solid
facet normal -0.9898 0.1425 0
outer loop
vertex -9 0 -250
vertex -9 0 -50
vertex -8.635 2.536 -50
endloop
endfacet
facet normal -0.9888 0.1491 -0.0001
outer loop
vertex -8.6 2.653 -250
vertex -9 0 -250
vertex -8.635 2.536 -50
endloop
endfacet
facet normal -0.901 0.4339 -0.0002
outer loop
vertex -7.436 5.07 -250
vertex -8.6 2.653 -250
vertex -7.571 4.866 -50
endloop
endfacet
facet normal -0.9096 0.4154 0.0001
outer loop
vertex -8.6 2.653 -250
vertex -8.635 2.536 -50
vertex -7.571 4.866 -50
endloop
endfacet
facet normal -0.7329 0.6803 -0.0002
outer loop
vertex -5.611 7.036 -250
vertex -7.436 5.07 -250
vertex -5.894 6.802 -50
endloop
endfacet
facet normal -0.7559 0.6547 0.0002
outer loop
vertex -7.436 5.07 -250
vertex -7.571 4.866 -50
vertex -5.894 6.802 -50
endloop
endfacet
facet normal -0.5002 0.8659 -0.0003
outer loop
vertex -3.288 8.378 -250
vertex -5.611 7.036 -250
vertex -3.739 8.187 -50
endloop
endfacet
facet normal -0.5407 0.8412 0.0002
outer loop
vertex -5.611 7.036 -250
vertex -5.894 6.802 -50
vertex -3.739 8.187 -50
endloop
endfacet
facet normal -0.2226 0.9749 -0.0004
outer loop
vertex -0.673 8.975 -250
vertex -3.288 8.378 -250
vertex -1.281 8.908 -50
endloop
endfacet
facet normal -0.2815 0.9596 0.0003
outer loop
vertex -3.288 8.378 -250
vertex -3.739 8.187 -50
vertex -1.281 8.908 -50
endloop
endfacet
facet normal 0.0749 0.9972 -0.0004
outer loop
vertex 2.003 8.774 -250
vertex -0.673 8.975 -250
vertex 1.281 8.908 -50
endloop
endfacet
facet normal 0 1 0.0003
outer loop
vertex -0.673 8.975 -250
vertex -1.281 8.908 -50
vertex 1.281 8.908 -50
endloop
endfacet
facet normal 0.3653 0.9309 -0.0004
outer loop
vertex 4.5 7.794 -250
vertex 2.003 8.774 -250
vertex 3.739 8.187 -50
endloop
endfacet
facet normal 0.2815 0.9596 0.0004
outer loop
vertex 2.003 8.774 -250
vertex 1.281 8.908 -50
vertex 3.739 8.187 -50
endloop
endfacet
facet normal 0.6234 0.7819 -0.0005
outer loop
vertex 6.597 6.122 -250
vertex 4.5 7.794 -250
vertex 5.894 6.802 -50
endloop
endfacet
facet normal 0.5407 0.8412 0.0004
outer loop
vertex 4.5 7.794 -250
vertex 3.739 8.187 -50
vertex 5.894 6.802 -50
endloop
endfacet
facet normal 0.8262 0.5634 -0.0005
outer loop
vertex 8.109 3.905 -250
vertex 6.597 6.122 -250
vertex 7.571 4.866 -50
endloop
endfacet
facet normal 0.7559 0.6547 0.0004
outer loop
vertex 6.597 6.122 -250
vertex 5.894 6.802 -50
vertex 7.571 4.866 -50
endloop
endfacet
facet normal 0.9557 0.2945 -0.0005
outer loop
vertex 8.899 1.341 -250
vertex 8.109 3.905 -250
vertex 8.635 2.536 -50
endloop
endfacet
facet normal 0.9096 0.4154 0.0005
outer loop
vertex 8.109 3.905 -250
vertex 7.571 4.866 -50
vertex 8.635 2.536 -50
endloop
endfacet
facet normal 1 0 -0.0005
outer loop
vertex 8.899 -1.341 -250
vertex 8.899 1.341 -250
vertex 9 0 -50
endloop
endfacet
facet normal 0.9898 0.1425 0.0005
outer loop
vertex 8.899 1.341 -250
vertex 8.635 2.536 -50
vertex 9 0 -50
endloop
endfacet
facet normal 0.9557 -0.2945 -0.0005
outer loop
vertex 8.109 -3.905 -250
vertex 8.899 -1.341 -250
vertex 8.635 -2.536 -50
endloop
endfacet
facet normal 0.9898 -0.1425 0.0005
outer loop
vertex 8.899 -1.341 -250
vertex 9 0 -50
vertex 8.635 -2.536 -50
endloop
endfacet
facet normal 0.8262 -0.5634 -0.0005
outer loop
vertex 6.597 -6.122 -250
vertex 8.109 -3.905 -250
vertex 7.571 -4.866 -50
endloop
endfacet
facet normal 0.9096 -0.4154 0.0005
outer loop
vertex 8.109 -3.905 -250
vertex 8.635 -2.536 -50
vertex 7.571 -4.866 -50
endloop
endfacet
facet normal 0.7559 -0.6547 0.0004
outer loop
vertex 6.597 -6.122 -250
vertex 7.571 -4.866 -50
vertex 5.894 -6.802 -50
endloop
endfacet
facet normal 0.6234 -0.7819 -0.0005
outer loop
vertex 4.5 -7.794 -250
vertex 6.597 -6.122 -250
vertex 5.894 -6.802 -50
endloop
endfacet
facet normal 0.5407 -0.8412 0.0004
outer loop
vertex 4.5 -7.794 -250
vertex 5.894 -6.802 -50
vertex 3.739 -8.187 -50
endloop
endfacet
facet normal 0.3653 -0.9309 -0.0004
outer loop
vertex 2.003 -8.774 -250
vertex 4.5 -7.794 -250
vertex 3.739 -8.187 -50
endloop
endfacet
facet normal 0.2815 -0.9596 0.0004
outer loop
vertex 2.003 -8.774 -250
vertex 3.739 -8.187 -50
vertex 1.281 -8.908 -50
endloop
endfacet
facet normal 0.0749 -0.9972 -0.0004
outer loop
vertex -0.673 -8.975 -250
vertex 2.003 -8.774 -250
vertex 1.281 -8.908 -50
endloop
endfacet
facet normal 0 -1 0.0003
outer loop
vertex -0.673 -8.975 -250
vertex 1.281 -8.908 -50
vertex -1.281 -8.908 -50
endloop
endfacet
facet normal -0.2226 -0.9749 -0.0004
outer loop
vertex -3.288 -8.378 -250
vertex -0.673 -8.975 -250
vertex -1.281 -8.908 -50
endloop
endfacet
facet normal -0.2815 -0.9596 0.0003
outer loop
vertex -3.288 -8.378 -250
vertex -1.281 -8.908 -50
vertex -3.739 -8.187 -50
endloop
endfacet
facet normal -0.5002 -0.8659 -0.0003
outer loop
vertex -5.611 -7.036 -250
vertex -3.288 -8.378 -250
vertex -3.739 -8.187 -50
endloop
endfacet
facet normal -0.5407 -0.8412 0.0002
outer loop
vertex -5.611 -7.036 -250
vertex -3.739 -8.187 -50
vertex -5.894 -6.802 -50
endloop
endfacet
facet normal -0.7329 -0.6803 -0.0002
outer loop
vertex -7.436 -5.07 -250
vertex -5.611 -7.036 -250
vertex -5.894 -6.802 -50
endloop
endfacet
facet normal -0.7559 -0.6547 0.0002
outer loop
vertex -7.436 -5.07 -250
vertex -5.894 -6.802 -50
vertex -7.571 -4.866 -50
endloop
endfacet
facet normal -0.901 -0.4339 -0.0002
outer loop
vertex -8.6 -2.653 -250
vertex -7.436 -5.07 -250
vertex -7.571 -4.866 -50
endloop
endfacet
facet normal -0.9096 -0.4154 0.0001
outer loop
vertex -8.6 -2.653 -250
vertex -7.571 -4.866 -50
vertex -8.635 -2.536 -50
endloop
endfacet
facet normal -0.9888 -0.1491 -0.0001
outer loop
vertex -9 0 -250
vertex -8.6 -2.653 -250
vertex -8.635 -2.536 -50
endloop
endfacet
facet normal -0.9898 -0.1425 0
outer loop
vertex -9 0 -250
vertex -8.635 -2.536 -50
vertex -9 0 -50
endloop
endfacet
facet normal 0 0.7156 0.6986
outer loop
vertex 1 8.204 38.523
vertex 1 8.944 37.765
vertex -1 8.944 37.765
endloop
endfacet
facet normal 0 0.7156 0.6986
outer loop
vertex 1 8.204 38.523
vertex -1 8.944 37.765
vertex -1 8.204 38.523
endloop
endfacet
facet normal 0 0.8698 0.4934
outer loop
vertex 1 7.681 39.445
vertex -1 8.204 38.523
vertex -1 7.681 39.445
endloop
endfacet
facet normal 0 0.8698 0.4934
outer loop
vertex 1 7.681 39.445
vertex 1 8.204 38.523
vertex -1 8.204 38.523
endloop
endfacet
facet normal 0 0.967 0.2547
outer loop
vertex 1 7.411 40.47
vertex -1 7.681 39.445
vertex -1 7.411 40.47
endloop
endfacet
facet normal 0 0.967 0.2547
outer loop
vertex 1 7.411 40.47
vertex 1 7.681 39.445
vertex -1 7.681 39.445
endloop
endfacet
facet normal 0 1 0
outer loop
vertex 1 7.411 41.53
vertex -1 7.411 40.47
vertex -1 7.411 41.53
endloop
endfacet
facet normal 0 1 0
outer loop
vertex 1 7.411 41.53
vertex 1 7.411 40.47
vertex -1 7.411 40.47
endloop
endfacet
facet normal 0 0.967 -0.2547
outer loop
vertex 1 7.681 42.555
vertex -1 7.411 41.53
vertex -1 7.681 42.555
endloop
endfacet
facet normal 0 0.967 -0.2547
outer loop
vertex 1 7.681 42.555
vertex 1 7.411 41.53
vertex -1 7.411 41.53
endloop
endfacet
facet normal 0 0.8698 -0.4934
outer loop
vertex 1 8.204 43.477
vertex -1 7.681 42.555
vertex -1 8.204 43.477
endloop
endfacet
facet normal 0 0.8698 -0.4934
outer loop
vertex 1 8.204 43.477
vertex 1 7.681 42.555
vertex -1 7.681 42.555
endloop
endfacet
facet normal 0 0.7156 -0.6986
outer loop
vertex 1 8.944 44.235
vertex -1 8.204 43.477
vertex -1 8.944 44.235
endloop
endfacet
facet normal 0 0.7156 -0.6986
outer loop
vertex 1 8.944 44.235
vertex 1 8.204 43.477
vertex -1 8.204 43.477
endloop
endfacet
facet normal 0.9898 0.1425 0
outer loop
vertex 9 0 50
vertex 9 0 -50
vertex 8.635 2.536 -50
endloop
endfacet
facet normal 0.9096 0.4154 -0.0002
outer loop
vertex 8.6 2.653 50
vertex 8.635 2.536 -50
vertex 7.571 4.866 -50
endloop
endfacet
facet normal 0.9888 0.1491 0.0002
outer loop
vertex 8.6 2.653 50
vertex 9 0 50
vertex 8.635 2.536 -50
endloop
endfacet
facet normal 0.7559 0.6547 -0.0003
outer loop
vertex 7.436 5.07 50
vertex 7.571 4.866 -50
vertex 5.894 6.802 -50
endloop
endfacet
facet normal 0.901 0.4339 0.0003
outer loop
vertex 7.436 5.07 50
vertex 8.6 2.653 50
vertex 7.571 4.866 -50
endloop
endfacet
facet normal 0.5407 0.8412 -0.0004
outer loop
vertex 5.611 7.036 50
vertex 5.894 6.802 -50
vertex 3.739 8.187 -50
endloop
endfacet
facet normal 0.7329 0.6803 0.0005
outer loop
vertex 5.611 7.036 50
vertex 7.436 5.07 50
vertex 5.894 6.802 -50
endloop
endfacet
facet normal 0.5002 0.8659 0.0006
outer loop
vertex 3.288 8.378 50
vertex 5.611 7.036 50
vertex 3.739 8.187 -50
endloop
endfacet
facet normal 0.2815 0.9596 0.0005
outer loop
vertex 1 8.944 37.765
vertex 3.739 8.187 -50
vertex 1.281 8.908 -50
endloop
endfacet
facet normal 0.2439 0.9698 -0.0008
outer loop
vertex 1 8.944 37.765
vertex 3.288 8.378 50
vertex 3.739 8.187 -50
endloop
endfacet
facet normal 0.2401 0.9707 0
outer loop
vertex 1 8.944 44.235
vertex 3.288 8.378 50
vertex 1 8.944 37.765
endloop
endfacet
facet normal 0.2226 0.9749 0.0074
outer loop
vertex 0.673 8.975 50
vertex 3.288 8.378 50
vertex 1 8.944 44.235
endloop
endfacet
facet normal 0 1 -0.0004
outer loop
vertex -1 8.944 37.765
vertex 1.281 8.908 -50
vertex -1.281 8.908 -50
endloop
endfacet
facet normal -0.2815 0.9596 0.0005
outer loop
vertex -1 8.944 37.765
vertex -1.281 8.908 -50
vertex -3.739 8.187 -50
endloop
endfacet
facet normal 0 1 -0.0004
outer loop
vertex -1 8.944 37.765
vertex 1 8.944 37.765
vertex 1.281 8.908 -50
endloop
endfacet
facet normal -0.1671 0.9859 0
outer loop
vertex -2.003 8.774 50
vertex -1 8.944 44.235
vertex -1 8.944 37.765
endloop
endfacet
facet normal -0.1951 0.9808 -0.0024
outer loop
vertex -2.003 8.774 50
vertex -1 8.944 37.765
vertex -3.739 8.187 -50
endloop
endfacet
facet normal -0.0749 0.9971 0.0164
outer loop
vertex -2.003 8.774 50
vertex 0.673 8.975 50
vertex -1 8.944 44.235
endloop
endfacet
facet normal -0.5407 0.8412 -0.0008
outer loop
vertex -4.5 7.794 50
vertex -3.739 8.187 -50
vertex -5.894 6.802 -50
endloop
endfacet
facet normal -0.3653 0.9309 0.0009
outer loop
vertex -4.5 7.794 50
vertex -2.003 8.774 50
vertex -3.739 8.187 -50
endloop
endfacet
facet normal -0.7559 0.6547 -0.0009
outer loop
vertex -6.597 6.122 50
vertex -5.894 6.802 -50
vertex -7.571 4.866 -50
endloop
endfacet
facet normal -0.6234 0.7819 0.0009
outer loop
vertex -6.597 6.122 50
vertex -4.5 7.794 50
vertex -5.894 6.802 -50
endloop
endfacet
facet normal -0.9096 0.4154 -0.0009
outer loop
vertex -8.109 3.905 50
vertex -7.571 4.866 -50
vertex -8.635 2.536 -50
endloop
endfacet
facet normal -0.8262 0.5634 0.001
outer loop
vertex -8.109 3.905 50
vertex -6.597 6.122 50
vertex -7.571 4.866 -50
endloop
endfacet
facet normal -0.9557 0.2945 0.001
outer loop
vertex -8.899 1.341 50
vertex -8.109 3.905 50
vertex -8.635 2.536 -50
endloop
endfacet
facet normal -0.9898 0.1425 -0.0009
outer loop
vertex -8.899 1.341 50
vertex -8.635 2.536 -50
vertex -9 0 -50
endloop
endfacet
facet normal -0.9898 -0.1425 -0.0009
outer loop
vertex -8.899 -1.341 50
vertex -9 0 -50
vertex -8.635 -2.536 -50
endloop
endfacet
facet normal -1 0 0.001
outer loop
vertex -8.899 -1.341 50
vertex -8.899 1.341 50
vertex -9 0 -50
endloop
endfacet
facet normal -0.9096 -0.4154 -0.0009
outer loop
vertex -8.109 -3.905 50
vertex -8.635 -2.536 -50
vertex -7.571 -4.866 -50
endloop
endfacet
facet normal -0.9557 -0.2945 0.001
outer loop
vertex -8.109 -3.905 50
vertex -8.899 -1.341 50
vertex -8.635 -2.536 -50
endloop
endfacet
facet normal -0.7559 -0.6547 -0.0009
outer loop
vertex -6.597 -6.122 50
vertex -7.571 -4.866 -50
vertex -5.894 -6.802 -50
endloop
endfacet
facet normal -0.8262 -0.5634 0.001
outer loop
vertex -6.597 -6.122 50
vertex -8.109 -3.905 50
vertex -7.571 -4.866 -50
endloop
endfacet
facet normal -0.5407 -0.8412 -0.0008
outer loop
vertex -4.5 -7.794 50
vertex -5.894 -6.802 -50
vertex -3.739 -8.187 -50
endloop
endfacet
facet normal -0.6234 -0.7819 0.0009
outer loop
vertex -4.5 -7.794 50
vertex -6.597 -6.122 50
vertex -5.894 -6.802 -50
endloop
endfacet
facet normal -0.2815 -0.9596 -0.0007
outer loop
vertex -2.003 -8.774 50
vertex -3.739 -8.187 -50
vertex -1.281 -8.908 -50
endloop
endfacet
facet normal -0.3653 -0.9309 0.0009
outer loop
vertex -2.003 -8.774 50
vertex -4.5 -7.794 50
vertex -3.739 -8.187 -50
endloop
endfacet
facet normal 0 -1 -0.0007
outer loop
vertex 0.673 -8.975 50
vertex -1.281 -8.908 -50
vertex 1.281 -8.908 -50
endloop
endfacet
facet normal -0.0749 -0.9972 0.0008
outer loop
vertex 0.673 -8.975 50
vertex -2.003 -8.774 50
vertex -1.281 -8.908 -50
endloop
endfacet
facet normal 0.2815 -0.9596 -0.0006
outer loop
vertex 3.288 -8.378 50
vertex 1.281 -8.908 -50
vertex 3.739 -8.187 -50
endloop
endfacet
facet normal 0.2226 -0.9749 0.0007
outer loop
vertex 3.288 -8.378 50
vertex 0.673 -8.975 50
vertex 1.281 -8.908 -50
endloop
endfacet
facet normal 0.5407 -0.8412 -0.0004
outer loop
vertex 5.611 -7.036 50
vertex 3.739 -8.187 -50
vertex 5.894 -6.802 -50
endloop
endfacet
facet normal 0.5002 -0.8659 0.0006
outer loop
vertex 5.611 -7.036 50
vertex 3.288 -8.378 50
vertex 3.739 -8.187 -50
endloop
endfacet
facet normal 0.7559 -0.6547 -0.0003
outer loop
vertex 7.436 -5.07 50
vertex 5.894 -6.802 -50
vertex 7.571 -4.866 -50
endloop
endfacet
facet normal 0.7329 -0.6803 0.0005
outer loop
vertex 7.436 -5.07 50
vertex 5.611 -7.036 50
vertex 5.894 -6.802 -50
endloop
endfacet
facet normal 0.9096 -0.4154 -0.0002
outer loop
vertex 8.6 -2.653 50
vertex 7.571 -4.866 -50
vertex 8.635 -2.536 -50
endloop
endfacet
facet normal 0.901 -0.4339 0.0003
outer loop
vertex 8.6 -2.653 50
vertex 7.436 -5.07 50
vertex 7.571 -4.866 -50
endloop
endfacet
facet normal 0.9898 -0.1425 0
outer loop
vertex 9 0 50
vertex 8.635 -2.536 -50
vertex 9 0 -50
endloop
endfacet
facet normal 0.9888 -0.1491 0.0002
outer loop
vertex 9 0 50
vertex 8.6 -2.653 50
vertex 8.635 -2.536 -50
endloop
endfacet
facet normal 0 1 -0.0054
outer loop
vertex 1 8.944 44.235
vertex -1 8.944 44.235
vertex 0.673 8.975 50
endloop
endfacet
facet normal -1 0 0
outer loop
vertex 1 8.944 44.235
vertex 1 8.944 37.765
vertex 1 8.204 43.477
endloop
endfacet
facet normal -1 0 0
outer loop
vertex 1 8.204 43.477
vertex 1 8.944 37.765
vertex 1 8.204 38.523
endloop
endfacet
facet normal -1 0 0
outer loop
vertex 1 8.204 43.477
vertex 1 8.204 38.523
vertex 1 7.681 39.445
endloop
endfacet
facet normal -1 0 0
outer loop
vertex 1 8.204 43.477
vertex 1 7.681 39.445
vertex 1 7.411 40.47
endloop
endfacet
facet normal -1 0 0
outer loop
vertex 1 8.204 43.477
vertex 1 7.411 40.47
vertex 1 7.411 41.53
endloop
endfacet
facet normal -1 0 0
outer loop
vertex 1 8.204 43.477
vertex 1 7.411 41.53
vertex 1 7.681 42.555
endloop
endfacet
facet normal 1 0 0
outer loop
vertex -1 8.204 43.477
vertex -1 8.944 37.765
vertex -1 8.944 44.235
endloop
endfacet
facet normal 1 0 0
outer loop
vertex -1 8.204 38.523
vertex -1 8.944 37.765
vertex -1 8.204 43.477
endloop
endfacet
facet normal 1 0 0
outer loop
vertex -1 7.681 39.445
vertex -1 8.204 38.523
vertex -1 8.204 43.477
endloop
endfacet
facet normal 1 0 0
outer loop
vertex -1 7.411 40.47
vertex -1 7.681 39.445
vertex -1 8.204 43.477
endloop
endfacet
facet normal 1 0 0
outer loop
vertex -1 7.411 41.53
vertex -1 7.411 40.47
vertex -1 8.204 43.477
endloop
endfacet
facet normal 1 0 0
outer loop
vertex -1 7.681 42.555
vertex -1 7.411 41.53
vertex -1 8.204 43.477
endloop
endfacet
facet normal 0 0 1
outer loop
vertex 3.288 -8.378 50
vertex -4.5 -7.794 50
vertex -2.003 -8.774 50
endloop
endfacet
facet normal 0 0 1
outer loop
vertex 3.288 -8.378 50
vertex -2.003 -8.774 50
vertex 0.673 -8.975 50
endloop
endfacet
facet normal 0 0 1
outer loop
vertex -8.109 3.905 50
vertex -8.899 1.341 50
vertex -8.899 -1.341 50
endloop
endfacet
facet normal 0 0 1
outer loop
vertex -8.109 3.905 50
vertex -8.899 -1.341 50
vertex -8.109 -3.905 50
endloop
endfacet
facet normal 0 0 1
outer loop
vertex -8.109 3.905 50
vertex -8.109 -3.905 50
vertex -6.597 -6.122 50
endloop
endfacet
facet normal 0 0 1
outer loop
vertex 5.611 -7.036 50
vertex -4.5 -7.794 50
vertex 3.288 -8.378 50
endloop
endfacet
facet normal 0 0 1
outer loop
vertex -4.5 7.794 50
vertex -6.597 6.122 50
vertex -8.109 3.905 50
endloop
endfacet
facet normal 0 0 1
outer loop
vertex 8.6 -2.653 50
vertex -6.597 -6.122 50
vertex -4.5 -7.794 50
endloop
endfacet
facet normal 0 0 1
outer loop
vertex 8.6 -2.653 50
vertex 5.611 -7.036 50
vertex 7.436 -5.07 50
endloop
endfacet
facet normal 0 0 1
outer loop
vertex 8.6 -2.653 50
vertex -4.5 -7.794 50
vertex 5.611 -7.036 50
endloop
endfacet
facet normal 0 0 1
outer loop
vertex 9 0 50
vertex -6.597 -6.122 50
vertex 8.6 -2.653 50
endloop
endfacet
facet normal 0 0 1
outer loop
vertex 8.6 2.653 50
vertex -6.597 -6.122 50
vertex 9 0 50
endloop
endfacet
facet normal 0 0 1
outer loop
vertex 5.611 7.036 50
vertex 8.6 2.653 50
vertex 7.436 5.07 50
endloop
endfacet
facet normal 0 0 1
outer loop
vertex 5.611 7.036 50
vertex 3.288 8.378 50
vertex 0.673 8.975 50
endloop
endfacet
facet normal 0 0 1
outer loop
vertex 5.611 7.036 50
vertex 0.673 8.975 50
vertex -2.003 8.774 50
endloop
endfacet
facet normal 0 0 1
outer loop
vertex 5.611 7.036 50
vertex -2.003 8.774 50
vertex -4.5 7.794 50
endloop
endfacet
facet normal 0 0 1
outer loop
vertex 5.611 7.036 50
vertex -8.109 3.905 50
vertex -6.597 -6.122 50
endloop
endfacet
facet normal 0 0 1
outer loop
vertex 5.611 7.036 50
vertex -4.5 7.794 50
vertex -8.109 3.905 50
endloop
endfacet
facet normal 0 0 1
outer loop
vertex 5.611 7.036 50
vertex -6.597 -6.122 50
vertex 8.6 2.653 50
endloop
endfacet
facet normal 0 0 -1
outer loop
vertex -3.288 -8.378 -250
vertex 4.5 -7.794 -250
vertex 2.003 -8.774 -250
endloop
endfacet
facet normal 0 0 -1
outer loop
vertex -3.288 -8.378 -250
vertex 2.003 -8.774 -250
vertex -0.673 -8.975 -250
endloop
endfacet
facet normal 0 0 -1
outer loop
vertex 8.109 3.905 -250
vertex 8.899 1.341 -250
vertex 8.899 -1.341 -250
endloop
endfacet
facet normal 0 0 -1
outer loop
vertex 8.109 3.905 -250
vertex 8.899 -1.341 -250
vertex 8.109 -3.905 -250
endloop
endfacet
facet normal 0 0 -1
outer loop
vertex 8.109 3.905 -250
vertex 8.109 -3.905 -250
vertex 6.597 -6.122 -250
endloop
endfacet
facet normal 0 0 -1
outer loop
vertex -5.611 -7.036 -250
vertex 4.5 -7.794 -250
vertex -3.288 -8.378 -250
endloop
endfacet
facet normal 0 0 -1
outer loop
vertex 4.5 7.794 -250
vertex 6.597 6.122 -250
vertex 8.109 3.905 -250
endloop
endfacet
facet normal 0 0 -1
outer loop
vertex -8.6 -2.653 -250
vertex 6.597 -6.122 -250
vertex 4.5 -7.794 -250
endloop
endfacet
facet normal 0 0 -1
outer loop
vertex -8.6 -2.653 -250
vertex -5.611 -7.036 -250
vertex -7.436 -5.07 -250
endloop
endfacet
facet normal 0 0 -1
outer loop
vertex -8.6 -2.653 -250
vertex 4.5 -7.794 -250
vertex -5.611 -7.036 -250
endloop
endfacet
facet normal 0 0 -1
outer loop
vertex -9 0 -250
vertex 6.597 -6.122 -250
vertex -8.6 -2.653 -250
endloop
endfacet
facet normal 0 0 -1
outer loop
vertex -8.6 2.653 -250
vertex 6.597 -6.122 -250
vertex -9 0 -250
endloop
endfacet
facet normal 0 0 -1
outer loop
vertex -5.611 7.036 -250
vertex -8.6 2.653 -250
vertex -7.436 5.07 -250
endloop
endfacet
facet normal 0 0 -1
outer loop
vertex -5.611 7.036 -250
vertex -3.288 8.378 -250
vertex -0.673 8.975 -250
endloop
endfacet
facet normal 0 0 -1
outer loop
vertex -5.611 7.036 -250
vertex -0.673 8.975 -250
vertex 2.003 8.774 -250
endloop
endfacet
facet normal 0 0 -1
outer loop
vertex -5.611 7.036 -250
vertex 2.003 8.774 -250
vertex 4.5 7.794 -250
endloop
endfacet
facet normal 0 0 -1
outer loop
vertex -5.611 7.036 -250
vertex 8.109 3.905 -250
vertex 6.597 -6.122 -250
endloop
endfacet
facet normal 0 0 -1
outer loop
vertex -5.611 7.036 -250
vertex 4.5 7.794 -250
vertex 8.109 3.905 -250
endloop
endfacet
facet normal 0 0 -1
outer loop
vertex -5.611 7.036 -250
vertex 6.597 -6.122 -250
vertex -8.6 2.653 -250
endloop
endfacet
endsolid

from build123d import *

# Parameters (mm, degrees)
SKETCH1_R           = 9
BOSS_EXTRUDE1_DEPTH = 50
CUT_EXTRUDE1_DEPTH  = 1
SKETCH3_R           = 9
BOSS_EXTRUDE2_DEPTH = 200


with BuildPart() as part:
    # Sketch1 → Boss-Extrude1 (new, symmetric)
    with BuildSketch(Plane.XY):
        Circle(SKETCH1_R)
    extrude(amount=BOSS_EXTRUDE1_DEPTH, both=True)

    # Sketch2 → Cut-Extrude1 (cut, symmetric)
    with BuildSketch(Plane(origin=(0, 0, 0), x_dir=(0, 0, -1), z_dir=(1, 0, 0))):
        with BuildLine():
            Line((-45, 10.5), (-37, 10.5))
            ThreePointArc((-37, 10.5), (-41, 7.376894374), (-45, 10.5))
        make_face()
    extrude(amount=CUT_EXTRUDE1_DEPTH, both=True, mode=Mode.SUBTRACT)

    # Sketch3 → Boss-Extrude2 (add)
    with BuildSketch(Plane(origin=(0, 0, -50), x_dir=(-1, 0, 0), z_dir=(0, 0, -1))):
        Circle(SKETCH3_R)
    extrude(amount=BOSS_EXTRUDE2_DEPTH)


solid = part.part
